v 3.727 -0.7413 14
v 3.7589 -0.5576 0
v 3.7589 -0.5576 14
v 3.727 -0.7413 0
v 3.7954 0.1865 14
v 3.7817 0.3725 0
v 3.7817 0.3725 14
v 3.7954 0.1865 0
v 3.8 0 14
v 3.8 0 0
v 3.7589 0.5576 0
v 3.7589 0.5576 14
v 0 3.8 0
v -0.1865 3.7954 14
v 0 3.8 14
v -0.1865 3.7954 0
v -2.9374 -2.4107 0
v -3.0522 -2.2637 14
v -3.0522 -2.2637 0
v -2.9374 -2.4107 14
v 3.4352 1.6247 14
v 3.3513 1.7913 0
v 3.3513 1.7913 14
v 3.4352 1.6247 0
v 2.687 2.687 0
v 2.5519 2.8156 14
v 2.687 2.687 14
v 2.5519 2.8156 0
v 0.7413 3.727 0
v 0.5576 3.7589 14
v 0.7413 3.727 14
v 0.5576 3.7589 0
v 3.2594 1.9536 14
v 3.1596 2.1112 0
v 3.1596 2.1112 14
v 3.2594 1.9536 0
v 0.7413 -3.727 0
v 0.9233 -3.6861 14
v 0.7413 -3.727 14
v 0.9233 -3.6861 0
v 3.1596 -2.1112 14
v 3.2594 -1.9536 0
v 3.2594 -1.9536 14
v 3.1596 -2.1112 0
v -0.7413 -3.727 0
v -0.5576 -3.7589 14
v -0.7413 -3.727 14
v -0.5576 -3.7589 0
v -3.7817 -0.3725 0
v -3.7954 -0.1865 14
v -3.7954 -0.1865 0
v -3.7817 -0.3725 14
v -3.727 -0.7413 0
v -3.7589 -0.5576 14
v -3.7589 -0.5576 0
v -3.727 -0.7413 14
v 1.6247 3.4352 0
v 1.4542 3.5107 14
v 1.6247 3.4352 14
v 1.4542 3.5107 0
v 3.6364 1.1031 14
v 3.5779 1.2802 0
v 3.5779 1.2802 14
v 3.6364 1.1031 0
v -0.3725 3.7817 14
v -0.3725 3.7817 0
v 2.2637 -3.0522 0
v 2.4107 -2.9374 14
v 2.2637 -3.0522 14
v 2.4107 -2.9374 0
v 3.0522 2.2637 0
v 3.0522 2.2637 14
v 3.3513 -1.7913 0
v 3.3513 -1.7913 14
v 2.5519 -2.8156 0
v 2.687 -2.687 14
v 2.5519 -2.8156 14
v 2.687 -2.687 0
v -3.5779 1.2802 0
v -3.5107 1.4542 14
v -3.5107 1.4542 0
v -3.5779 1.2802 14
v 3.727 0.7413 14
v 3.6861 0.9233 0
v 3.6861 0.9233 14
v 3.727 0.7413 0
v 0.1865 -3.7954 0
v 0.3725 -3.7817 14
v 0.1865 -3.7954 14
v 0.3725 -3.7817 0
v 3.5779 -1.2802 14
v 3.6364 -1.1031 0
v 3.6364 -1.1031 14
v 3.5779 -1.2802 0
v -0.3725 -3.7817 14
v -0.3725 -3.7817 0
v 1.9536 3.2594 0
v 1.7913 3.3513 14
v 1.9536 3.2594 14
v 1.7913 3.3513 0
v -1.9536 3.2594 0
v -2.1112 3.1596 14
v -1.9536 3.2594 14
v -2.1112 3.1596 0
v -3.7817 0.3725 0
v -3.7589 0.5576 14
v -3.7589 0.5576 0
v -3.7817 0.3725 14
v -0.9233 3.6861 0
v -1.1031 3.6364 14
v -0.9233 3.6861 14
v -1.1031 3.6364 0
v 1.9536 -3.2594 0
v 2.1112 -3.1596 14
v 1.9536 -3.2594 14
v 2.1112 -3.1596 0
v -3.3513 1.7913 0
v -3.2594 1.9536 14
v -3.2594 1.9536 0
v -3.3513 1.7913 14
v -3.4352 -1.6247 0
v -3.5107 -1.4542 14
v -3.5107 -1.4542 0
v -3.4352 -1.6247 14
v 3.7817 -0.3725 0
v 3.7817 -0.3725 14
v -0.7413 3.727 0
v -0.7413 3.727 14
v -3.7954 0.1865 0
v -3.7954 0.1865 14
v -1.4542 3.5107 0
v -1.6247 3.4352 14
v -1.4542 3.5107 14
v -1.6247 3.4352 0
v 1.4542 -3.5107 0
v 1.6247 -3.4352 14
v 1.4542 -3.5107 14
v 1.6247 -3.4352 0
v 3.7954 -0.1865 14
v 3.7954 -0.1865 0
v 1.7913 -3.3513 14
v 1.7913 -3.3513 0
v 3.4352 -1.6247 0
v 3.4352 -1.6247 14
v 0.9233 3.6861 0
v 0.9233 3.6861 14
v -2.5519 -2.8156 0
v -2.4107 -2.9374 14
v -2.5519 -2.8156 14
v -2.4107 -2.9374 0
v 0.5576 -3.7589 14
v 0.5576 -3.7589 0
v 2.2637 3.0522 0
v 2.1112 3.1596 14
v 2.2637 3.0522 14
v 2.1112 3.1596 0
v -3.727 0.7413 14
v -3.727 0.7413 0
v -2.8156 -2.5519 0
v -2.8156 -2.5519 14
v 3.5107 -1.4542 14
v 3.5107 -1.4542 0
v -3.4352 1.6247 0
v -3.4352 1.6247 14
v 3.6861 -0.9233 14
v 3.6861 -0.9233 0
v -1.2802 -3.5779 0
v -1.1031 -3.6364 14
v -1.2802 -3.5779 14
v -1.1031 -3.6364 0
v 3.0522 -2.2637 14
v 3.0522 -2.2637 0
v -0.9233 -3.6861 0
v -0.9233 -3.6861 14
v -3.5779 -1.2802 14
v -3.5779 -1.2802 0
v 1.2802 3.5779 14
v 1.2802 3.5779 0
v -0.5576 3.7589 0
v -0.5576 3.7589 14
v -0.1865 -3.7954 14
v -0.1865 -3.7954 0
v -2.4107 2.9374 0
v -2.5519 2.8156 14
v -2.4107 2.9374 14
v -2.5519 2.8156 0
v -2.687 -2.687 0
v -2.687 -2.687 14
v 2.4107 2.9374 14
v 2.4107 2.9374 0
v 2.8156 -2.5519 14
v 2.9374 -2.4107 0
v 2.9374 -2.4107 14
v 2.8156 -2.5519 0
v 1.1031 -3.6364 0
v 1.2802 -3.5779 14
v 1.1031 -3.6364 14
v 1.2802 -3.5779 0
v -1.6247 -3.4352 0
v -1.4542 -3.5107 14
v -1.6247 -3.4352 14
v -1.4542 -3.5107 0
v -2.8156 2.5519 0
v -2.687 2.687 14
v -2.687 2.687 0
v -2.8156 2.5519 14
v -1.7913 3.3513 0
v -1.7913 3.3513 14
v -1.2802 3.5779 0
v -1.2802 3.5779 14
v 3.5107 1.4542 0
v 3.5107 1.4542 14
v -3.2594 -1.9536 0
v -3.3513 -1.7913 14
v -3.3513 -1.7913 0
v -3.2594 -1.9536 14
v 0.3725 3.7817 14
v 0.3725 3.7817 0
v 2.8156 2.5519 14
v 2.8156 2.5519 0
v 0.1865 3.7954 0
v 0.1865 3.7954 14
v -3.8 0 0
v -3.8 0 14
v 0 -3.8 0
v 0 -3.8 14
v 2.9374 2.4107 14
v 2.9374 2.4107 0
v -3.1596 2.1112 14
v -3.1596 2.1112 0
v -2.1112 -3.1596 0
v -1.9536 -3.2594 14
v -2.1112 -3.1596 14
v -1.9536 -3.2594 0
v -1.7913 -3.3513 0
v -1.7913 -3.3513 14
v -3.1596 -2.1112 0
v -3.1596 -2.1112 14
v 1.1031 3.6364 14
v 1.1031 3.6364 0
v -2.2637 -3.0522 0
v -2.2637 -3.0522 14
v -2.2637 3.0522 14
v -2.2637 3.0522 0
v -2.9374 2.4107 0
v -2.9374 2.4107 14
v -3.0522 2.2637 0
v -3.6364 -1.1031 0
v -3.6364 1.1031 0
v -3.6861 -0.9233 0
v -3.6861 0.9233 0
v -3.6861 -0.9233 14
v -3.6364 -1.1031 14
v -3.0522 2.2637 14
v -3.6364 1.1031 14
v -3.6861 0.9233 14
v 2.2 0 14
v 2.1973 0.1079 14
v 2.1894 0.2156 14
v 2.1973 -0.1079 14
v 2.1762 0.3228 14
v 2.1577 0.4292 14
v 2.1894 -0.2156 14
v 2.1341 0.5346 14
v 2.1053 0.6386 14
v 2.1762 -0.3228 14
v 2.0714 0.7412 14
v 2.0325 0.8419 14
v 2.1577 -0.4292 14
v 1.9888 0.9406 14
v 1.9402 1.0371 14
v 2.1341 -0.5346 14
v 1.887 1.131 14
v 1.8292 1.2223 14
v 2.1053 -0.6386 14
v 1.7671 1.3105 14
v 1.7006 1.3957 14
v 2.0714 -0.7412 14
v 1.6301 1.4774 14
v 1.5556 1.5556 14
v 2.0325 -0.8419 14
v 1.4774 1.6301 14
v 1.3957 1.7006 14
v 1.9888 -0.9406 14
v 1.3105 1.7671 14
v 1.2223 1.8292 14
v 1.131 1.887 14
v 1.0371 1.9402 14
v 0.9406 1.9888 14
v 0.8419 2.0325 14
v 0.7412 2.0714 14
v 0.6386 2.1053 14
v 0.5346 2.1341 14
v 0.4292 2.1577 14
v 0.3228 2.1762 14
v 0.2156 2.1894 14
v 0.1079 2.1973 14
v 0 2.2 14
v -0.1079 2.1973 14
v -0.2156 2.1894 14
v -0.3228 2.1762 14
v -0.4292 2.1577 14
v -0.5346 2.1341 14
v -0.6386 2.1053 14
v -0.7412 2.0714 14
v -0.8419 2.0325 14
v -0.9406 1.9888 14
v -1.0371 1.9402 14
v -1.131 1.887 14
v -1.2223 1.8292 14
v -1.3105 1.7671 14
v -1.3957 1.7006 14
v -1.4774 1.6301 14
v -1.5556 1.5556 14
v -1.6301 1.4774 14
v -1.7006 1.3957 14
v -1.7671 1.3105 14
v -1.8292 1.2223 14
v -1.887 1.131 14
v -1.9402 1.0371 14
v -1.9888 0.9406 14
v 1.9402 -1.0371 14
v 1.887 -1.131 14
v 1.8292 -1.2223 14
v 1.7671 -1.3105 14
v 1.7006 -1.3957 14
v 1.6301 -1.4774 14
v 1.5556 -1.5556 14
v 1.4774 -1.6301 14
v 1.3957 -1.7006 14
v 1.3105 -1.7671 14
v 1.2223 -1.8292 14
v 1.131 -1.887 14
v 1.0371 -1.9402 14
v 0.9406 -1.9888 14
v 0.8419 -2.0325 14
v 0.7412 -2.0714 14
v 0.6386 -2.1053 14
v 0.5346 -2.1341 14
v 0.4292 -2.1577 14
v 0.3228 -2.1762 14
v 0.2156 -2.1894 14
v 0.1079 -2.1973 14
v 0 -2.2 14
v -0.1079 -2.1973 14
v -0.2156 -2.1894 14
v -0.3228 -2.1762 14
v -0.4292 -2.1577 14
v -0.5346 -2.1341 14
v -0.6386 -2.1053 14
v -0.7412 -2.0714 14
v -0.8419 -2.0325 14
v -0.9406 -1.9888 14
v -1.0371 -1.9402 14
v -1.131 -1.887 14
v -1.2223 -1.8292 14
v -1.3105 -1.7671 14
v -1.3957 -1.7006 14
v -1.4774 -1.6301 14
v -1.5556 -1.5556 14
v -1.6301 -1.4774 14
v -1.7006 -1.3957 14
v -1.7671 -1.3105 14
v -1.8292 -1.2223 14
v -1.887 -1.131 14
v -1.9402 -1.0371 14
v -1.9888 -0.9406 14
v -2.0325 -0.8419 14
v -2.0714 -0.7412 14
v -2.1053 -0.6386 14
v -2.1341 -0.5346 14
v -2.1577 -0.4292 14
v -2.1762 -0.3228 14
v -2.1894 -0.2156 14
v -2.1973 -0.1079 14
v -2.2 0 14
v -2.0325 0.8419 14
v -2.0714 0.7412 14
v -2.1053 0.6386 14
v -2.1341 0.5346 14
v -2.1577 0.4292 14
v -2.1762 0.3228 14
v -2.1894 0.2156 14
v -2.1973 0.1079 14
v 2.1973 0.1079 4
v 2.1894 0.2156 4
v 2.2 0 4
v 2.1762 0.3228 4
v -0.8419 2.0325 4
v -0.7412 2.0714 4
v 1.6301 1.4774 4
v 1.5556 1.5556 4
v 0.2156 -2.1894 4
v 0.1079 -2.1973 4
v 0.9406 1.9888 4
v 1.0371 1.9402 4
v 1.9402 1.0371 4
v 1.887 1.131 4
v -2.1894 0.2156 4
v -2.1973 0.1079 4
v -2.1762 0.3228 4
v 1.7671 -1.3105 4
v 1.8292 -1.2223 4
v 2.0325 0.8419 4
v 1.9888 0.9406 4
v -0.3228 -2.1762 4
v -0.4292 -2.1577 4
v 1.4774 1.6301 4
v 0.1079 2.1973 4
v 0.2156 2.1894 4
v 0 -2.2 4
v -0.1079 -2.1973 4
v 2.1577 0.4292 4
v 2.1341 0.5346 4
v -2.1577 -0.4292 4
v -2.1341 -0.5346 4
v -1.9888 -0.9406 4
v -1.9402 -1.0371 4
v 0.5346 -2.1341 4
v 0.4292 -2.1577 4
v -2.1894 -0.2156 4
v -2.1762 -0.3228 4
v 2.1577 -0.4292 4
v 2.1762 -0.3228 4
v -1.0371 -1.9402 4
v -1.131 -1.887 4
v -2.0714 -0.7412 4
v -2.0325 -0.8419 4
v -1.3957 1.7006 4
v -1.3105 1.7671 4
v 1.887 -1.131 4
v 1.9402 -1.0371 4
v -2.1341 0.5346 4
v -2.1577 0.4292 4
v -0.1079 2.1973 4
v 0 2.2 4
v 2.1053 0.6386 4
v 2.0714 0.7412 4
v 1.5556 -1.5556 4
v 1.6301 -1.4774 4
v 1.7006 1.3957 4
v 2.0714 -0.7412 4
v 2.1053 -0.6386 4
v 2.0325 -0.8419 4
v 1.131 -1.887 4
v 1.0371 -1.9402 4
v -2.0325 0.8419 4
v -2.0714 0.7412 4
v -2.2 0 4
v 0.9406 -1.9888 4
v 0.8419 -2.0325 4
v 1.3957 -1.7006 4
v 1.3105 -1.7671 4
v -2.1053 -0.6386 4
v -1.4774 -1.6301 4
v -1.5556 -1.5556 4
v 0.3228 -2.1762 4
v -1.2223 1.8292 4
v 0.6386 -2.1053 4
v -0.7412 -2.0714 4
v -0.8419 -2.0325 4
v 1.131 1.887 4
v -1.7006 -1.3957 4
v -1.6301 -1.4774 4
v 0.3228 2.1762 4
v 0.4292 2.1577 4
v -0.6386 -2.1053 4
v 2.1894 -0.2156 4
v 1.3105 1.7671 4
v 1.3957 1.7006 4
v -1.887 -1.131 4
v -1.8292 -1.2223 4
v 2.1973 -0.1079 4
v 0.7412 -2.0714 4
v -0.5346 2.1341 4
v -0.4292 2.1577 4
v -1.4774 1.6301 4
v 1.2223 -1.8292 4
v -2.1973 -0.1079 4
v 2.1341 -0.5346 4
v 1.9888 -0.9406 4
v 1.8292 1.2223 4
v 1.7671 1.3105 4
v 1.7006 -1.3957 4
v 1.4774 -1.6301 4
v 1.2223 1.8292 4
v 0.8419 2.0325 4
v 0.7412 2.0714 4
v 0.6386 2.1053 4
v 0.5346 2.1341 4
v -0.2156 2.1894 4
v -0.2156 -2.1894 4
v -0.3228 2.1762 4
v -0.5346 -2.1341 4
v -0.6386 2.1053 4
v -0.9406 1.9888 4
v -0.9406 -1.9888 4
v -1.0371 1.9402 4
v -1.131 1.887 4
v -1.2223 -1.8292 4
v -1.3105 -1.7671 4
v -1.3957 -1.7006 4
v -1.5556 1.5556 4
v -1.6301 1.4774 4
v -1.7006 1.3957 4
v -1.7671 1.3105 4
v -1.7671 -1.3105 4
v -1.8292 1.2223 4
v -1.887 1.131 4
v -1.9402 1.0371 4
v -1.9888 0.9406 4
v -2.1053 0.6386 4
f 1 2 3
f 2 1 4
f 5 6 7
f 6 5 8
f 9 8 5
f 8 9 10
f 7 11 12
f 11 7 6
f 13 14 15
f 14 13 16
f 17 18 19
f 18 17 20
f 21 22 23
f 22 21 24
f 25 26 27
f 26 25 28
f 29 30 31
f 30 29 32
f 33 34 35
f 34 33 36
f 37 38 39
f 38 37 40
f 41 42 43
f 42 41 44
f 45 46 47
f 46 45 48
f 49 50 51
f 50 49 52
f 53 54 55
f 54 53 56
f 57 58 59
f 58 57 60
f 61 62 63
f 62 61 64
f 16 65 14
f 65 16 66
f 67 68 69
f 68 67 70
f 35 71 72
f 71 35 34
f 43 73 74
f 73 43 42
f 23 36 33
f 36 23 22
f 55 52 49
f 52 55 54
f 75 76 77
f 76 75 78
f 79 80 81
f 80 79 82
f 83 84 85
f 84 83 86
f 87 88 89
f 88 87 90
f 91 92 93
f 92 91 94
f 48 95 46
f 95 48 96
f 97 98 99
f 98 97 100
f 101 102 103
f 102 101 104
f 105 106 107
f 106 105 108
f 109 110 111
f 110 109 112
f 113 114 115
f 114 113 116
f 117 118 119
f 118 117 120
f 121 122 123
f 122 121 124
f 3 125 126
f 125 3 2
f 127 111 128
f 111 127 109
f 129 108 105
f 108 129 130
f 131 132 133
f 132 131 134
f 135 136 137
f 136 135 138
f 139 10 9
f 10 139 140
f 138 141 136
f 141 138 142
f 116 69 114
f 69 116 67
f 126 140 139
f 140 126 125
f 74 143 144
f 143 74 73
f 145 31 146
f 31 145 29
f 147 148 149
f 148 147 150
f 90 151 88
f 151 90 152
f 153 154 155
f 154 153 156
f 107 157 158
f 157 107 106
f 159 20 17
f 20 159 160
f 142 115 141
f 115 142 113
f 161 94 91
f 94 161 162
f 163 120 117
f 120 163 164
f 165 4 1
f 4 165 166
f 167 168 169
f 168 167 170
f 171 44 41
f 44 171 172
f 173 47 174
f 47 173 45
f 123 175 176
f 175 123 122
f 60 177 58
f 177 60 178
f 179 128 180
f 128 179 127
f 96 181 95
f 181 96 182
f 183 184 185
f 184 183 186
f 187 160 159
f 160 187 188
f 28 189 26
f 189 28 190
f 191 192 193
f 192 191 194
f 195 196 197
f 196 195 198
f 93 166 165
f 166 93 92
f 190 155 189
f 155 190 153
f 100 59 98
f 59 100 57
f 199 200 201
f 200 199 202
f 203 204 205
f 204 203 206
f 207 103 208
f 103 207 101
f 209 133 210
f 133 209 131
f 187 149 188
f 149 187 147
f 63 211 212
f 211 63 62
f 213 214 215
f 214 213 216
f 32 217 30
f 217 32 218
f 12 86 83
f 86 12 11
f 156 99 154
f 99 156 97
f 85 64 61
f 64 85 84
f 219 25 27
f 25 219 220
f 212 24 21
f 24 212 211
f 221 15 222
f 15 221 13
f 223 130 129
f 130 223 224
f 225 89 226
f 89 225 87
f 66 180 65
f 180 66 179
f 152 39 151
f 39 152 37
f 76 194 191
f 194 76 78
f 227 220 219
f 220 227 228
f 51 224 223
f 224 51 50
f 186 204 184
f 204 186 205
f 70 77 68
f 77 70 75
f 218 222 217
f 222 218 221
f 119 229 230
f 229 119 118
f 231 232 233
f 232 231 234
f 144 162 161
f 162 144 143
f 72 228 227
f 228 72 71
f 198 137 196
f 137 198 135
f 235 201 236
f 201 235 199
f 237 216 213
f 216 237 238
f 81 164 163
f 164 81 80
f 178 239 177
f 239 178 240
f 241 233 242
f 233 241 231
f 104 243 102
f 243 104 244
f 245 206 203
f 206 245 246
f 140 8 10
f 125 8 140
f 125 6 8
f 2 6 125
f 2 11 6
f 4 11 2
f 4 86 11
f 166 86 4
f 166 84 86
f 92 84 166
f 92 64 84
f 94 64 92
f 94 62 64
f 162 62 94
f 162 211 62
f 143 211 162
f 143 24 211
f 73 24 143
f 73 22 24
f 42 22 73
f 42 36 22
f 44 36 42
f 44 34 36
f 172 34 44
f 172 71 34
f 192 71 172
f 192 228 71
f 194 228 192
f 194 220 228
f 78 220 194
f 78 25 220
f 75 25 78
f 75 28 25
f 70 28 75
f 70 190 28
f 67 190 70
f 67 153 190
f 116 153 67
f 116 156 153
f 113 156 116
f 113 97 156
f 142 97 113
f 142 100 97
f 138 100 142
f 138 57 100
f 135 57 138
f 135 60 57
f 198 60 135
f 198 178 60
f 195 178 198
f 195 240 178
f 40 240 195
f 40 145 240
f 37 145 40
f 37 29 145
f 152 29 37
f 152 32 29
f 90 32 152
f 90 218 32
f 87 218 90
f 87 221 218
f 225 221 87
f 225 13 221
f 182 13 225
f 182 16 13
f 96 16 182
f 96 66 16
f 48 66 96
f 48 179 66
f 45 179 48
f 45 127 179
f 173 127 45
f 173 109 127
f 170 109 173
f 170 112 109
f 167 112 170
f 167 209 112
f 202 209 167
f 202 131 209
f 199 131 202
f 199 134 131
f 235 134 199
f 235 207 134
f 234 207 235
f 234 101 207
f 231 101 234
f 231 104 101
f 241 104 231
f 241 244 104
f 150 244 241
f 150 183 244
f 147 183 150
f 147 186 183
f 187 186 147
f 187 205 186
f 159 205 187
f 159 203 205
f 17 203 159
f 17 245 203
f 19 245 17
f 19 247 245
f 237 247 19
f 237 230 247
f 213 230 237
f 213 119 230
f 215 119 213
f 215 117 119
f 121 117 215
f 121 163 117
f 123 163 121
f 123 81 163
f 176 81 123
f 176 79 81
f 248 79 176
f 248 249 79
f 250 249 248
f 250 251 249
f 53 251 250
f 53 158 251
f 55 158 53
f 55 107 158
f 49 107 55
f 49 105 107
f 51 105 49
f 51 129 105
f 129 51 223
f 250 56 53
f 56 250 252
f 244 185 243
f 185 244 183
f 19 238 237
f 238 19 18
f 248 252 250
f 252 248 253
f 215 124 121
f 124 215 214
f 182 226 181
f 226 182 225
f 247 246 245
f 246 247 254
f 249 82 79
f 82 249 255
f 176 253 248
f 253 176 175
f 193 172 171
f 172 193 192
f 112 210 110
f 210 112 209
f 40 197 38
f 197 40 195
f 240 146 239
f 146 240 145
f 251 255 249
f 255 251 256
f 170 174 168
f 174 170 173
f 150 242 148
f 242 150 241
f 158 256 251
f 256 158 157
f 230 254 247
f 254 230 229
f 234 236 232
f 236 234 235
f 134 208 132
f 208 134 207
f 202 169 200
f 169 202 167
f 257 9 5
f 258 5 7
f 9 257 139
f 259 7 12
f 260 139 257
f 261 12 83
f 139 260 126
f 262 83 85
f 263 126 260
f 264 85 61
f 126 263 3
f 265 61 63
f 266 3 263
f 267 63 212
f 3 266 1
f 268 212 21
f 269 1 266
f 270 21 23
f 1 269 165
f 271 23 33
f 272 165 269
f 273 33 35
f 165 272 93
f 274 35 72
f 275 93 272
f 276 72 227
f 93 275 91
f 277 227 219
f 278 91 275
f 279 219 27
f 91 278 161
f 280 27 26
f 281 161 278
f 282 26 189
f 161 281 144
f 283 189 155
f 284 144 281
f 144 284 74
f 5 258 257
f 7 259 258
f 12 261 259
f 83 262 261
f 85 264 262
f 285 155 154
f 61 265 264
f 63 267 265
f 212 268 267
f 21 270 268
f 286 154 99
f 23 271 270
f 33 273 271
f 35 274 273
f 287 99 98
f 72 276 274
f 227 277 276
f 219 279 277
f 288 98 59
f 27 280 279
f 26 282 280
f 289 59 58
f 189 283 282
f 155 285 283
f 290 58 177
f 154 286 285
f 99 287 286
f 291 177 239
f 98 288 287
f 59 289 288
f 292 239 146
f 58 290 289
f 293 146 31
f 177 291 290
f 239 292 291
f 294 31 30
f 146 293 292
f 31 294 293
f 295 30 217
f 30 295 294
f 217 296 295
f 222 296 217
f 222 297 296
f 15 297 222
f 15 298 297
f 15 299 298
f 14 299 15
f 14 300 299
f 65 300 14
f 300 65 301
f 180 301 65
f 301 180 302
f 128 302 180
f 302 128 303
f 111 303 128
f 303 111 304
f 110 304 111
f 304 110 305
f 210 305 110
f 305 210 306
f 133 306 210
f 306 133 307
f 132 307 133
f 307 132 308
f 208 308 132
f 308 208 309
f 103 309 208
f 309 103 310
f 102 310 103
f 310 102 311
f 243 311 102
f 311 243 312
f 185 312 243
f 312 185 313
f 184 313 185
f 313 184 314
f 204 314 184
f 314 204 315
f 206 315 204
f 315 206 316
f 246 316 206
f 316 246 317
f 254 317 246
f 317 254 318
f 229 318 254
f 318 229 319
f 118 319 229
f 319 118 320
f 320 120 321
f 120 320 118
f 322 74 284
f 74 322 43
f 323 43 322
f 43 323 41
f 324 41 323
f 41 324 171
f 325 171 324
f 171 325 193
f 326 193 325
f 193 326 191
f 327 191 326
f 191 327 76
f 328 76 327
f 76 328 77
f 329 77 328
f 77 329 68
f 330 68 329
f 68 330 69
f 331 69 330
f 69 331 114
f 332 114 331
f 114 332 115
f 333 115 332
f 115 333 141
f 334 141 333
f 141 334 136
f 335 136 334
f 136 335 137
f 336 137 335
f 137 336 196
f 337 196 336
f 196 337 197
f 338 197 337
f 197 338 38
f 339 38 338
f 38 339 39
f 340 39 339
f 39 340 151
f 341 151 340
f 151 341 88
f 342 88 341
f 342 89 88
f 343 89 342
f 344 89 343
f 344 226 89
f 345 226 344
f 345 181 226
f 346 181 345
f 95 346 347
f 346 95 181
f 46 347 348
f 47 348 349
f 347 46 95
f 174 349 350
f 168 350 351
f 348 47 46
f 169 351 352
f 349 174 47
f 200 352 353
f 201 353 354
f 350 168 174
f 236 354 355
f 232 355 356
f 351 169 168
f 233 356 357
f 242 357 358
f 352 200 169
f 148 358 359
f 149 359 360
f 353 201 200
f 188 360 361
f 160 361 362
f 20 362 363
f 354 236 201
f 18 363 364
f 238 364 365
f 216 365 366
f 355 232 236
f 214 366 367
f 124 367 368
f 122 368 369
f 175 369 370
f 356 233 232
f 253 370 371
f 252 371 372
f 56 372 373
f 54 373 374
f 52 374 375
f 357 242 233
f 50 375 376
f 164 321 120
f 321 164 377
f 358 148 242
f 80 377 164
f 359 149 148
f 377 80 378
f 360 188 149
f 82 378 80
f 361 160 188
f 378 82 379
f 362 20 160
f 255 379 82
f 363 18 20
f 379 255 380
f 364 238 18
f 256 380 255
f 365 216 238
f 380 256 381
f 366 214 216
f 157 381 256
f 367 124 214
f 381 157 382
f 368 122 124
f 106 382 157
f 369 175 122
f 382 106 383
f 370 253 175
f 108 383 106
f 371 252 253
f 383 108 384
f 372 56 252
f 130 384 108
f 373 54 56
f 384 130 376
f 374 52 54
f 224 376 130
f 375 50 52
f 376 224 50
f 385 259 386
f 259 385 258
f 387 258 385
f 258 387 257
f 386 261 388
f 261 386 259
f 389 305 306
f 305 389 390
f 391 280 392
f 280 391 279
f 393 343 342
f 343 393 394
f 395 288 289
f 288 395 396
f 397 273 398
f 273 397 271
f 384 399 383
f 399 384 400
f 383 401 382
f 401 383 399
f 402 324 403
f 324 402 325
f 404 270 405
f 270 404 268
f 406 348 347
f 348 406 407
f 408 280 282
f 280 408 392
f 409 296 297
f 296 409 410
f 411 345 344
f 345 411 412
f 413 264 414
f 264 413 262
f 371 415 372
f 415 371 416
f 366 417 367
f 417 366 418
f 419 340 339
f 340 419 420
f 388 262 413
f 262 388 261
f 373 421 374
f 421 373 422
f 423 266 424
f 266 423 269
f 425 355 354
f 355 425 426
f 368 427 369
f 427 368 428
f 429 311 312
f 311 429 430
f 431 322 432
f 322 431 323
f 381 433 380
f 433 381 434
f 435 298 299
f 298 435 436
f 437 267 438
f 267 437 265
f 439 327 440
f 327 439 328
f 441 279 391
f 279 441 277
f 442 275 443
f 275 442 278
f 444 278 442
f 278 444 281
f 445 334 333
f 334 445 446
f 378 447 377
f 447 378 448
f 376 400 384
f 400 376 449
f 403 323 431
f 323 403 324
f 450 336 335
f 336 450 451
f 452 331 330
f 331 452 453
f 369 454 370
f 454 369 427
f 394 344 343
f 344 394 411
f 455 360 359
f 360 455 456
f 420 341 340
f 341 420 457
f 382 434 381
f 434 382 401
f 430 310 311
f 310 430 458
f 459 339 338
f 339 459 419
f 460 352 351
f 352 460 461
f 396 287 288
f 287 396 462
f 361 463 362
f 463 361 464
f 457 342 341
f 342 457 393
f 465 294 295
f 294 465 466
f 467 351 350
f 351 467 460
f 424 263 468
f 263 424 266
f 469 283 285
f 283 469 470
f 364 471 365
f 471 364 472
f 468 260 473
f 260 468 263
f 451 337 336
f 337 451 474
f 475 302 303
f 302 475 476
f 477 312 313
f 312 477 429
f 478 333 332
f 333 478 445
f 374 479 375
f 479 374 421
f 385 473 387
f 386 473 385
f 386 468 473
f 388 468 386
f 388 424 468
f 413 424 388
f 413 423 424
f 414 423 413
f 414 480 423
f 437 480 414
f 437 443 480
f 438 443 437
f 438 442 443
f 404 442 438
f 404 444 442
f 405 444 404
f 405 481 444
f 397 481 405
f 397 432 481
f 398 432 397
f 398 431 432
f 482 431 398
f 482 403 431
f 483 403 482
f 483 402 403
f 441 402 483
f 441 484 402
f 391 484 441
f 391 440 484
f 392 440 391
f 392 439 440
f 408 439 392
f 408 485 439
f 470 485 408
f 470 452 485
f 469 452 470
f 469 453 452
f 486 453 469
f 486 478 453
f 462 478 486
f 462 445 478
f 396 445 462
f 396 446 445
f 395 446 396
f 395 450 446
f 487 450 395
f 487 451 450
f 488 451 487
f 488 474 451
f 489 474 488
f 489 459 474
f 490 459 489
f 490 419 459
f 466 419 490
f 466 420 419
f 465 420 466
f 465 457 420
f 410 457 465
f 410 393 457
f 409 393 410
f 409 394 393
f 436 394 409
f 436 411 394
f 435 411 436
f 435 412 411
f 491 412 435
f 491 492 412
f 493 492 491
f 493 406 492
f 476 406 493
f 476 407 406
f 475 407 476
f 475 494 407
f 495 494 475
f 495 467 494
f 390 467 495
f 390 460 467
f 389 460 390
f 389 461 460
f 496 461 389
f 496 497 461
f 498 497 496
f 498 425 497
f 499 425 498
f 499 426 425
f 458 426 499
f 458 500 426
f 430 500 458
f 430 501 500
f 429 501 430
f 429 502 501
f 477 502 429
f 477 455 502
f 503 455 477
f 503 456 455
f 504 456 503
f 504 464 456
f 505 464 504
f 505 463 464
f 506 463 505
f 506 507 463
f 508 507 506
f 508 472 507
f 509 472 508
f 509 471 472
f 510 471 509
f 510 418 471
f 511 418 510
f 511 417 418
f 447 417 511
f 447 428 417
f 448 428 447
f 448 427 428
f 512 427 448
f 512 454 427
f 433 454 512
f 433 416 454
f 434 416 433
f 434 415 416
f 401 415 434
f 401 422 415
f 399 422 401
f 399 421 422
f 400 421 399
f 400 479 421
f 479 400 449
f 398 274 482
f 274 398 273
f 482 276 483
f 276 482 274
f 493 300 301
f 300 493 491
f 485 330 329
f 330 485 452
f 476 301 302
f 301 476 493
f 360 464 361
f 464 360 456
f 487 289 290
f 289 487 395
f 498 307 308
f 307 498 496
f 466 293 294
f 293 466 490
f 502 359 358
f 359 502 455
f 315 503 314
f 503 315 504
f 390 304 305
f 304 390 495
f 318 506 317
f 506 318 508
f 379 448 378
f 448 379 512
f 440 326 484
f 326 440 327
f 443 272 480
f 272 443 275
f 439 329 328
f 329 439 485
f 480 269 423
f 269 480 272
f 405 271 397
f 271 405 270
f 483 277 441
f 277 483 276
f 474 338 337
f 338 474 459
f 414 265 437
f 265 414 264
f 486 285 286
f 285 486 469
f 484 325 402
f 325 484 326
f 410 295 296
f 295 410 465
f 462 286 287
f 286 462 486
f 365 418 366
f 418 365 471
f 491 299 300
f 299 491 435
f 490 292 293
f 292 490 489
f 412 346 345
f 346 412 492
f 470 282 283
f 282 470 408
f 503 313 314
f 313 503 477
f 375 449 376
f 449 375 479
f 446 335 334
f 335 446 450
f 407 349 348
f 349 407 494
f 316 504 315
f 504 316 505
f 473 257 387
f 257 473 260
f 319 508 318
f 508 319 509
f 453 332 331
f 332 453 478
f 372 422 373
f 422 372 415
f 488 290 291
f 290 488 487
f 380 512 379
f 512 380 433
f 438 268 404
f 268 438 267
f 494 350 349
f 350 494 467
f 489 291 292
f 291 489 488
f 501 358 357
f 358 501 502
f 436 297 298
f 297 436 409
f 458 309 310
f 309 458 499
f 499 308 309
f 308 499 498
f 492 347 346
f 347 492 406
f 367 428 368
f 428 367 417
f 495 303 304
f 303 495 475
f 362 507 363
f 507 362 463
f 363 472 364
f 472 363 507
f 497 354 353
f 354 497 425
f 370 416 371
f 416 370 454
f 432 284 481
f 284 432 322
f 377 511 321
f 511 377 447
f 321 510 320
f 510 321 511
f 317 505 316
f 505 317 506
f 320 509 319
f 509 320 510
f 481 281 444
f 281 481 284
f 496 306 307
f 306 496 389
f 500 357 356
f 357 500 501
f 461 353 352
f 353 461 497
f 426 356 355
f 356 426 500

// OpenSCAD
// ПК8010 Корвет right-side button. All dimensions are in millimetres.
// Print standing on the closed end, with the bore facing upward.

outer_diameter = 7.6;
wall_thickness = 1.6;
length = 14;
bore_depth = 10;

bore_diameter = outer_diameter - 2 * wall_thickness;
end_thickness = length - bore_depth;
epsilon = 0.01;
$fn = 128;

assert(bore_diameter > 0 && wall_thickness > 0);
assert(bore_depth > 0 && end_thickness > 0);

difference() {
    cylinder(d = outer_diameter, h = length);
    translate([0, 0, end_thickness])
        cylinder(d = bore_diameter, h = bore_depth + epsilon);
}
